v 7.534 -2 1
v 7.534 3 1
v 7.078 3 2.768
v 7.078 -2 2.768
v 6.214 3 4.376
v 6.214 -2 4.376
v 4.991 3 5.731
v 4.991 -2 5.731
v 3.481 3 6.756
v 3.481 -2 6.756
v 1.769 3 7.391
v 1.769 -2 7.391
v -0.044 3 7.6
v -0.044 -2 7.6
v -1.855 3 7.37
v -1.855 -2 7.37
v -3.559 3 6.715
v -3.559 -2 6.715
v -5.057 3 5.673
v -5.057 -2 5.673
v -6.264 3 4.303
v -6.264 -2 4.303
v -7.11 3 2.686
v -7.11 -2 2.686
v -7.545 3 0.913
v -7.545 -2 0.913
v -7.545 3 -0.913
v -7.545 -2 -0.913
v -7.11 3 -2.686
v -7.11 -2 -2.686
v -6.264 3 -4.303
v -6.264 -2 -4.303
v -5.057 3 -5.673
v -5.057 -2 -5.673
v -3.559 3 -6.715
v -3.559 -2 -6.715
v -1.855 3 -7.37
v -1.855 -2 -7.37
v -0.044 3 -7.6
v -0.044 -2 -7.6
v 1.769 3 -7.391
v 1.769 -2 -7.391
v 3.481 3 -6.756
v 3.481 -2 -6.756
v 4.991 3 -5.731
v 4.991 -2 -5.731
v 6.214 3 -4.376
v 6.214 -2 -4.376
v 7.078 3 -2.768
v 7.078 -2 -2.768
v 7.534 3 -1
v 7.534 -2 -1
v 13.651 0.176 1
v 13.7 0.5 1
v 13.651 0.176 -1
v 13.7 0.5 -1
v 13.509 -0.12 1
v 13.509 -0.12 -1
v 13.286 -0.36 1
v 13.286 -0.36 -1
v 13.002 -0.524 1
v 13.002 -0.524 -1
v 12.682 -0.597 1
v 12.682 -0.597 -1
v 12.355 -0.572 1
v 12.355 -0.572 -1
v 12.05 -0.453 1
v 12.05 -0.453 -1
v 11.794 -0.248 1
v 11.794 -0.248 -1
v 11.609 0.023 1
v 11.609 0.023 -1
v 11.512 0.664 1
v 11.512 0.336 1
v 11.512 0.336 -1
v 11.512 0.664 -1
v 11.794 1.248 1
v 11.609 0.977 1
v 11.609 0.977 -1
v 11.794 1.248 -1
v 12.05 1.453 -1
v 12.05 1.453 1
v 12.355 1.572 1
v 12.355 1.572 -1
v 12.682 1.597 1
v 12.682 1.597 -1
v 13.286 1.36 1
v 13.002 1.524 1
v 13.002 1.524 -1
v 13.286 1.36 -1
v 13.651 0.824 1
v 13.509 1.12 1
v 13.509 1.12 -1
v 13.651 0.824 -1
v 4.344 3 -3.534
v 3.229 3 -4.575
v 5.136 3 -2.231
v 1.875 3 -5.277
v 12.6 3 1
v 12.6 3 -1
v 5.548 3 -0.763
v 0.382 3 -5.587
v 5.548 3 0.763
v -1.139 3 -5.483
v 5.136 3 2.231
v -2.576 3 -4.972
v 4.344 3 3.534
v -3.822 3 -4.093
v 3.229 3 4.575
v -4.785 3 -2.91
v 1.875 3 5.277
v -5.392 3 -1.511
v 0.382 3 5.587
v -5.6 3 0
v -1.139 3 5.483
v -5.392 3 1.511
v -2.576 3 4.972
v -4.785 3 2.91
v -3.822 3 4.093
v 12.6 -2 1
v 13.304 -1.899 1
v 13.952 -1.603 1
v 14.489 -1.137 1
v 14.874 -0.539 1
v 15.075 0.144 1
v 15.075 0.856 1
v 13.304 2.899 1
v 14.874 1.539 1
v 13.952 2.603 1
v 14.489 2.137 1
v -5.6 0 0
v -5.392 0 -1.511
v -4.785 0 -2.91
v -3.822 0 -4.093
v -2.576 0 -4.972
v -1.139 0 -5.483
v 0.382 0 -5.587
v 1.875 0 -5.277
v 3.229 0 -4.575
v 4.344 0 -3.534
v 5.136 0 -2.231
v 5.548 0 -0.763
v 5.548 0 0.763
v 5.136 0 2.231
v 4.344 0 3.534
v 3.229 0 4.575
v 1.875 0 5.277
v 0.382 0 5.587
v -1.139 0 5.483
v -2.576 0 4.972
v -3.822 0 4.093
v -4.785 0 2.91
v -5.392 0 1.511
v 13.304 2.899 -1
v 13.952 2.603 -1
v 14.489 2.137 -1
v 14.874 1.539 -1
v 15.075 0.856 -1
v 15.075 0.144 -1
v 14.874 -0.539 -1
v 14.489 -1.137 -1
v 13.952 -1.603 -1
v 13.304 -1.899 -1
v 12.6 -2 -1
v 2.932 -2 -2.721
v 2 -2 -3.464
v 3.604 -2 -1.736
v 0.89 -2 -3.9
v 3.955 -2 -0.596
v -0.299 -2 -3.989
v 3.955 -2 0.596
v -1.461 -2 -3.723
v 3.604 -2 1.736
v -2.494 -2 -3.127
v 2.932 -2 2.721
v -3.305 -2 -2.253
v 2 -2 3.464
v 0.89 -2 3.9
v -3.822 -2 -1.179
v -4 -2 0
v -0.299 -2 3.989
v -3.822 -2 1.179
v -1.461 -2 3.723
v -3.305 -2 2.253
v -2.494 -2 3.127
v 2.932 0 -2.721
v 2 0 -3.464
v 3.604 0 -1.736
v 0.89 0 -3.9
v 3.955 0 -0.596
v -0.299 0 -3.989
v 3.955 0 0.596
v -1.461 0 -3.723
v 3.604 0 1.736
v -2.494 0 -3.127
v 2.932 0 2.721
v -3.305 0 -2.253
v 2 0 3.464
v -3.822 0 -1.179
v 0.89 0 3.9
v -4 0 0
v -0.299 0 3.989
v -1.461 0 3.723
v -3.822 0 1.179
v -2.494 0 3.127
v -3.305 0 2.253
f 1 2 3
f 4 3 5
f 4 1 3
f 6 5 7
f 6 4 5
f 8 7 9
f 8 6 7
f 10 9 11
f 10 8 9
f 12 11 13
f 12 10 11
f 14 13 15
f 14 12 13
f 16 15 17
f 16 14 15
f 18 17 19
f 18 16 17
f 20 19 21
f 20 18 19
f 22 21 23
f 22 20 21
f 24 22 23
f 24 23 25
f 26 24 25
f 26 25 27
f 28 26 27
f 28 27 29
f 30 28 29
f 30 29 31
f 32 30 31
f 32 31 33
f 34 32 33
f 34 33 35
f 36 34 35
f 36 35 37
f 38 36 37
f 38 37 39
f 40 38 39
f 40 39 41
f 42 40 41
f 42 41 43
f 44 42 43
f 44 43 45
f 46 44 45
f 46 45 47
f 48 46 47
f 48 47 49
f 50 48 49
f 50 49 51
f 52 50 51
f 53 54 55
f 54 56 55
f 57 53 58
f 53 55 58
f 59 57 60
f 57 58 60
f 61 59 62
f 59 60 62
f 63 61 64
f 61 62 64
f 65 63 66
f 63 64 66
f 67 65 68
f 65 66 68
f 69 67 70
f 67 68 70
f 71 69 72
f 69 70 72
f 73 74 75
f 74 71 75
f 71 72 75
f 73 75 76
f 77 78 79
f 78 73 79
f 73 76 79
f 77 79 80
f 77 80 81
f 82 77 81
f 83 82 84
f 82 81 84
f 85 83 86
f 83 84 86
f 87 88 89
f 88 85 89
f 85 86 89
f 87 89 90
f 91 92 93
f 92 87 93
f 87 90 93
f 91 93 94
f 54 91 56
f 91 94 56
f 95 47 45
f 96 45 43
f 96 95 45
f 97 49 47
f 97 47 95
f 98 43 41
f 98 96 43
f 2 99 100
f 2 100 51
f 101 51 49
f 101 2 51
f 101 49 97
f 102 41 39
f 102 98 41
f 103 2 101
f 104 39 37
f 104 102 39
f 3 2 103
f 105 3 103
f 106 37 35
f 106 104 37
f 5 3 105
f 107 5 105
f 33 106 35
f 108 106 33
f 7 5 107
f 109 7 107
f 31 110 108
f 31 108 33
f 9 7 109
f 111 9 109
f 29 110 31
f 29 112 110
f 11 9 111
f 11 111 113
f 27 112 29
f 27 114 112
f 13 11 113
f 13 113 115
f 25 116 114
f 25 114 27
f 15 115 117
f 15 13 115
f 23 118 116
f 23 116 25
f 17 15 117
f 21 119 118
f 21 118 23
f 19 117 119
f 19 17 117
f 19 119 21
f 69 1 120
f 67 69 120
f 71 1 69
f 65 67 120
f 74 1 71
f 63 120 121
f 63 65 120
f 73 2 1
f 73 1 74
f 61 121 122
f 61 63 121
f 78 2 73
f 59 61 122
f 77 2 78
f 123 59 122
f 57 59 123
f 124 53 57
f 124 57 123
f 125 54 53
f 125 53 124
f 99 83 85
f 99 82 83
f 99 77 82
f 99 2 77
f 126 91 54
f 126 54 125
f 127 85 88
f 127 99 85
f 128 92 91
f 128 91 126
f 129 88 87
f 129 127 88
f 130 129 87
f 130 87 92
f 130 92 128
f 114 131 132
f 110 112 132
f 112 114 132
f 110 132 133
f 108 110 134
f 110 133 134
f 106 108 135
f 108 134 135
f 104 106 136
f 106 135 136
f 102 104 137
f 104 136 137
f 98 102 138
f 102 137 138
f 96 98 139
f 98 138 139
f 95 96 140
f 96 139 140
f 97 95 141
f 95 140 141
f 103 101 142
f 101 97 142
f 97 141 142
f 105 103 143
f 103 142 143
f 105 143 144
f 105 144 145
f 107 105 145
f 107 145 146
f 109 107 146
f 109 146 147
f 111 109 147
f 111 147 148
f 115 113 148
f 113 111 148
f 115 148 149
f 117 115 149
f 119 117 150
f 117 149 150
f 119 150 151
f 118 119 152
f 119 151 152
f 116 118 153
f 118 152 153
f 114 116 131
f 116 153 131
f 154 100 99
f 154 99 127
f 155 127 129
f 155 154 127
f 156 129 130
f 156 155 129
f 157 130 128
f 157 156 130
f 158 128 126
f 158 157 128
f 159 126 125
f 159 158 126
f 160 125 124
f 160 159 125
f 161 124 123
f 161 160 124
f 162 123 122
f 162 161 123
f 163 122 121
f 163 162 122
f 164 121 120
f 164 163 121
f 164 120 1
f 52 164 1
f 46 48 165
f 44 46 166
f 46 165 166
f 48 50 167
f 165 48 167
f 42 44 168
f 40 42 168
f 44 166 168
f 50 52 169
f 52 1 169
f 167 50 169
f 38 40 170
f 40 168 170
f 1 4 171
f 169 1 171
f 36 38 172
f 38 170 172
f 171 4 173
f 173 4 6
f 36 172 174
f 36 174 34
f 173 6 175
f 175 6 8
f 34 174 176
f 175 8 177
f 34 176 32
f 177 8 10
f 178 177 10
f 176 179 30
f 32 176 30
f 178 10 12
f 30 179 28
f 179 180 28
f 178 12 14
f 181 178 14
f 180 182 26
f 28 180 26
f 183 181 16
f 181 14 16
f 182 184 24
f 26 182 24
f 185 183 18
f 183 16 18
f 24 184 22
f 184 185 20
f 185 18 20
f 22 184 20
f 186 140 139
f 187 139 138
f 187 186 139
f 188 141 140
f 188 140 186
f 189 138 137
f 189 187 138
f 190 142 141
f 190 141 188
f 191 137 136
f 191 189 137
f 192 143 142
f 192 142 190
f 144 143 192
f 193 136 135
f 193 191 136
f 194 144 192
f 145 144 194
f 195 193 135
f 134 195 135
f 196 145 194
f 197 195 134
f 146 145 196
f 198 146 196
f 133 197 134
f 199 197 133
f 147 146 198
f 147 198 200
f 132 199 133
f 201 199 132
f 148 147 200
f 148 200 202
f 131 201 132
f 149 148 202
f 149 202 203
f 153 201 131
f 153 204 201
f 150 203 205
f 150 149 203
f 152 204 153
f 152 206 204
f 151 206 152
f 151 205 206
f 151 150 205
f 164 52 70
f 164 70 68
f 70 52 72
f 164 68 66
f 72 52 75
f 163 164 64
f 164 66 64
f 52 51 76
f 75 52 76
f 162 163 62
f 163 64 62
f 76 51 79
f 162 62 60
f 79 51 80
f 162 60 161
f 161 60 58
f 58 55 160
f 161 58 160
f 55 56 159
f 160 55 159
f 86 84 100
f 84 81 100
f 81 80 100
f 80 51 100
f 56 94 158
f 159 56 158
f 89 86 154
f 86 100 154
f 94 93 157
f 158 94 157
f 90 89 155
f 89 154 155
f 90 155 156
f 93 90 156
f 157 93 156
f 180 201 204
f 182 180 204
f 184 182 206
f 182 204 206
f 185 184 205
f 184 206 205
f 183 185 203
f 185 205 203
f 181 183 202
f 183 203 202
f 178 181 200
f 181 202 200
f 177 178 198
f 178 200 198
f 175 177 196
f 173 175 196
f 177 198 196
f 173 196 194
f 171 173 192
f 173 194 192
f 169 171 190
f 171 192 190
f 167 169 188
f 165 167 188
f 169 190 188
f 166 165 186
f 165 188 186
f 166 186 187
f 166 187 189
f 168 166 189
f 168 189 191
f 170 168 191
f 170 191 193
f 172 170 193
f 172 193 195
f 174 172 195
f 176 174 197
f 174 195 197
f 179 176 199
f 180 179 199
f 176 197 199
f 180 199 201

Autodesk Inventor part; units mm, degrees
ref_plane "YZ Plane" through (0, 0, 0) normal (1, 0, 0) x (0, 1, 0)
ref_plane "XZ Plane" through (0, 0, 0) normal (0, 1, 0) x (-1, 0, 0)
ref_plane "XY Plane" through (0, 0, 0) normal (0, 0, 1) x (1, 0, 0)
sketch "Sketch1" plane through (0, 0, 0) normal (0, 1, 0) x (-1, 0, 0)
  circle A0 centre (0, 0) radius 4
  circle A1 centre (0, 0) radius 5.6
  circle A2 centre (0, 0) radius 7.6
  dimension "d0" = 8
  dimension "d1" = 11.2
  dimension "d14" = 2
extrude "Extrusion1" add sketch "Sketch1" against normal blind 2 contours A1 | A2
extrude "Extrusion2" add sketch "Sketch1" along normal blind 3 contours A2
sketch "Sketch2" plane through (0, 0, 0) normal (0, 0, 1) x (1, 0, 0)
  line L0 (7.6, 3) -> (7.6, -2) projected
  line L1 (7.6, 3) -> (12.6, 3)
  line L2 (7.6, -2) -> (12.6, -2)
  line L3 (7.6, 0.5) -> (12.6, 0.5) construction
  circle A0 centre (12.6, 0.5) radius 2.5
  circle A1 centre (12.6, 0.5) radius 1.1
  line L4 (7.6, 3) -> (6.6, 3)
  line L5 (6.6, 3) -> (6.6, -2)
  line L6 (6.6, -2) -> (7.6, -2)
  point P0 (0, 0)
  dimension "d7" = 2.2
  dimension "d8" = 5
  dimension "d11" = 1
  dimension "d15" = 5
extrude "Extrusion3" add sketch "Sketch2" along normal mid plane 2
properties part number "Bearing Grip_3DPrint"
